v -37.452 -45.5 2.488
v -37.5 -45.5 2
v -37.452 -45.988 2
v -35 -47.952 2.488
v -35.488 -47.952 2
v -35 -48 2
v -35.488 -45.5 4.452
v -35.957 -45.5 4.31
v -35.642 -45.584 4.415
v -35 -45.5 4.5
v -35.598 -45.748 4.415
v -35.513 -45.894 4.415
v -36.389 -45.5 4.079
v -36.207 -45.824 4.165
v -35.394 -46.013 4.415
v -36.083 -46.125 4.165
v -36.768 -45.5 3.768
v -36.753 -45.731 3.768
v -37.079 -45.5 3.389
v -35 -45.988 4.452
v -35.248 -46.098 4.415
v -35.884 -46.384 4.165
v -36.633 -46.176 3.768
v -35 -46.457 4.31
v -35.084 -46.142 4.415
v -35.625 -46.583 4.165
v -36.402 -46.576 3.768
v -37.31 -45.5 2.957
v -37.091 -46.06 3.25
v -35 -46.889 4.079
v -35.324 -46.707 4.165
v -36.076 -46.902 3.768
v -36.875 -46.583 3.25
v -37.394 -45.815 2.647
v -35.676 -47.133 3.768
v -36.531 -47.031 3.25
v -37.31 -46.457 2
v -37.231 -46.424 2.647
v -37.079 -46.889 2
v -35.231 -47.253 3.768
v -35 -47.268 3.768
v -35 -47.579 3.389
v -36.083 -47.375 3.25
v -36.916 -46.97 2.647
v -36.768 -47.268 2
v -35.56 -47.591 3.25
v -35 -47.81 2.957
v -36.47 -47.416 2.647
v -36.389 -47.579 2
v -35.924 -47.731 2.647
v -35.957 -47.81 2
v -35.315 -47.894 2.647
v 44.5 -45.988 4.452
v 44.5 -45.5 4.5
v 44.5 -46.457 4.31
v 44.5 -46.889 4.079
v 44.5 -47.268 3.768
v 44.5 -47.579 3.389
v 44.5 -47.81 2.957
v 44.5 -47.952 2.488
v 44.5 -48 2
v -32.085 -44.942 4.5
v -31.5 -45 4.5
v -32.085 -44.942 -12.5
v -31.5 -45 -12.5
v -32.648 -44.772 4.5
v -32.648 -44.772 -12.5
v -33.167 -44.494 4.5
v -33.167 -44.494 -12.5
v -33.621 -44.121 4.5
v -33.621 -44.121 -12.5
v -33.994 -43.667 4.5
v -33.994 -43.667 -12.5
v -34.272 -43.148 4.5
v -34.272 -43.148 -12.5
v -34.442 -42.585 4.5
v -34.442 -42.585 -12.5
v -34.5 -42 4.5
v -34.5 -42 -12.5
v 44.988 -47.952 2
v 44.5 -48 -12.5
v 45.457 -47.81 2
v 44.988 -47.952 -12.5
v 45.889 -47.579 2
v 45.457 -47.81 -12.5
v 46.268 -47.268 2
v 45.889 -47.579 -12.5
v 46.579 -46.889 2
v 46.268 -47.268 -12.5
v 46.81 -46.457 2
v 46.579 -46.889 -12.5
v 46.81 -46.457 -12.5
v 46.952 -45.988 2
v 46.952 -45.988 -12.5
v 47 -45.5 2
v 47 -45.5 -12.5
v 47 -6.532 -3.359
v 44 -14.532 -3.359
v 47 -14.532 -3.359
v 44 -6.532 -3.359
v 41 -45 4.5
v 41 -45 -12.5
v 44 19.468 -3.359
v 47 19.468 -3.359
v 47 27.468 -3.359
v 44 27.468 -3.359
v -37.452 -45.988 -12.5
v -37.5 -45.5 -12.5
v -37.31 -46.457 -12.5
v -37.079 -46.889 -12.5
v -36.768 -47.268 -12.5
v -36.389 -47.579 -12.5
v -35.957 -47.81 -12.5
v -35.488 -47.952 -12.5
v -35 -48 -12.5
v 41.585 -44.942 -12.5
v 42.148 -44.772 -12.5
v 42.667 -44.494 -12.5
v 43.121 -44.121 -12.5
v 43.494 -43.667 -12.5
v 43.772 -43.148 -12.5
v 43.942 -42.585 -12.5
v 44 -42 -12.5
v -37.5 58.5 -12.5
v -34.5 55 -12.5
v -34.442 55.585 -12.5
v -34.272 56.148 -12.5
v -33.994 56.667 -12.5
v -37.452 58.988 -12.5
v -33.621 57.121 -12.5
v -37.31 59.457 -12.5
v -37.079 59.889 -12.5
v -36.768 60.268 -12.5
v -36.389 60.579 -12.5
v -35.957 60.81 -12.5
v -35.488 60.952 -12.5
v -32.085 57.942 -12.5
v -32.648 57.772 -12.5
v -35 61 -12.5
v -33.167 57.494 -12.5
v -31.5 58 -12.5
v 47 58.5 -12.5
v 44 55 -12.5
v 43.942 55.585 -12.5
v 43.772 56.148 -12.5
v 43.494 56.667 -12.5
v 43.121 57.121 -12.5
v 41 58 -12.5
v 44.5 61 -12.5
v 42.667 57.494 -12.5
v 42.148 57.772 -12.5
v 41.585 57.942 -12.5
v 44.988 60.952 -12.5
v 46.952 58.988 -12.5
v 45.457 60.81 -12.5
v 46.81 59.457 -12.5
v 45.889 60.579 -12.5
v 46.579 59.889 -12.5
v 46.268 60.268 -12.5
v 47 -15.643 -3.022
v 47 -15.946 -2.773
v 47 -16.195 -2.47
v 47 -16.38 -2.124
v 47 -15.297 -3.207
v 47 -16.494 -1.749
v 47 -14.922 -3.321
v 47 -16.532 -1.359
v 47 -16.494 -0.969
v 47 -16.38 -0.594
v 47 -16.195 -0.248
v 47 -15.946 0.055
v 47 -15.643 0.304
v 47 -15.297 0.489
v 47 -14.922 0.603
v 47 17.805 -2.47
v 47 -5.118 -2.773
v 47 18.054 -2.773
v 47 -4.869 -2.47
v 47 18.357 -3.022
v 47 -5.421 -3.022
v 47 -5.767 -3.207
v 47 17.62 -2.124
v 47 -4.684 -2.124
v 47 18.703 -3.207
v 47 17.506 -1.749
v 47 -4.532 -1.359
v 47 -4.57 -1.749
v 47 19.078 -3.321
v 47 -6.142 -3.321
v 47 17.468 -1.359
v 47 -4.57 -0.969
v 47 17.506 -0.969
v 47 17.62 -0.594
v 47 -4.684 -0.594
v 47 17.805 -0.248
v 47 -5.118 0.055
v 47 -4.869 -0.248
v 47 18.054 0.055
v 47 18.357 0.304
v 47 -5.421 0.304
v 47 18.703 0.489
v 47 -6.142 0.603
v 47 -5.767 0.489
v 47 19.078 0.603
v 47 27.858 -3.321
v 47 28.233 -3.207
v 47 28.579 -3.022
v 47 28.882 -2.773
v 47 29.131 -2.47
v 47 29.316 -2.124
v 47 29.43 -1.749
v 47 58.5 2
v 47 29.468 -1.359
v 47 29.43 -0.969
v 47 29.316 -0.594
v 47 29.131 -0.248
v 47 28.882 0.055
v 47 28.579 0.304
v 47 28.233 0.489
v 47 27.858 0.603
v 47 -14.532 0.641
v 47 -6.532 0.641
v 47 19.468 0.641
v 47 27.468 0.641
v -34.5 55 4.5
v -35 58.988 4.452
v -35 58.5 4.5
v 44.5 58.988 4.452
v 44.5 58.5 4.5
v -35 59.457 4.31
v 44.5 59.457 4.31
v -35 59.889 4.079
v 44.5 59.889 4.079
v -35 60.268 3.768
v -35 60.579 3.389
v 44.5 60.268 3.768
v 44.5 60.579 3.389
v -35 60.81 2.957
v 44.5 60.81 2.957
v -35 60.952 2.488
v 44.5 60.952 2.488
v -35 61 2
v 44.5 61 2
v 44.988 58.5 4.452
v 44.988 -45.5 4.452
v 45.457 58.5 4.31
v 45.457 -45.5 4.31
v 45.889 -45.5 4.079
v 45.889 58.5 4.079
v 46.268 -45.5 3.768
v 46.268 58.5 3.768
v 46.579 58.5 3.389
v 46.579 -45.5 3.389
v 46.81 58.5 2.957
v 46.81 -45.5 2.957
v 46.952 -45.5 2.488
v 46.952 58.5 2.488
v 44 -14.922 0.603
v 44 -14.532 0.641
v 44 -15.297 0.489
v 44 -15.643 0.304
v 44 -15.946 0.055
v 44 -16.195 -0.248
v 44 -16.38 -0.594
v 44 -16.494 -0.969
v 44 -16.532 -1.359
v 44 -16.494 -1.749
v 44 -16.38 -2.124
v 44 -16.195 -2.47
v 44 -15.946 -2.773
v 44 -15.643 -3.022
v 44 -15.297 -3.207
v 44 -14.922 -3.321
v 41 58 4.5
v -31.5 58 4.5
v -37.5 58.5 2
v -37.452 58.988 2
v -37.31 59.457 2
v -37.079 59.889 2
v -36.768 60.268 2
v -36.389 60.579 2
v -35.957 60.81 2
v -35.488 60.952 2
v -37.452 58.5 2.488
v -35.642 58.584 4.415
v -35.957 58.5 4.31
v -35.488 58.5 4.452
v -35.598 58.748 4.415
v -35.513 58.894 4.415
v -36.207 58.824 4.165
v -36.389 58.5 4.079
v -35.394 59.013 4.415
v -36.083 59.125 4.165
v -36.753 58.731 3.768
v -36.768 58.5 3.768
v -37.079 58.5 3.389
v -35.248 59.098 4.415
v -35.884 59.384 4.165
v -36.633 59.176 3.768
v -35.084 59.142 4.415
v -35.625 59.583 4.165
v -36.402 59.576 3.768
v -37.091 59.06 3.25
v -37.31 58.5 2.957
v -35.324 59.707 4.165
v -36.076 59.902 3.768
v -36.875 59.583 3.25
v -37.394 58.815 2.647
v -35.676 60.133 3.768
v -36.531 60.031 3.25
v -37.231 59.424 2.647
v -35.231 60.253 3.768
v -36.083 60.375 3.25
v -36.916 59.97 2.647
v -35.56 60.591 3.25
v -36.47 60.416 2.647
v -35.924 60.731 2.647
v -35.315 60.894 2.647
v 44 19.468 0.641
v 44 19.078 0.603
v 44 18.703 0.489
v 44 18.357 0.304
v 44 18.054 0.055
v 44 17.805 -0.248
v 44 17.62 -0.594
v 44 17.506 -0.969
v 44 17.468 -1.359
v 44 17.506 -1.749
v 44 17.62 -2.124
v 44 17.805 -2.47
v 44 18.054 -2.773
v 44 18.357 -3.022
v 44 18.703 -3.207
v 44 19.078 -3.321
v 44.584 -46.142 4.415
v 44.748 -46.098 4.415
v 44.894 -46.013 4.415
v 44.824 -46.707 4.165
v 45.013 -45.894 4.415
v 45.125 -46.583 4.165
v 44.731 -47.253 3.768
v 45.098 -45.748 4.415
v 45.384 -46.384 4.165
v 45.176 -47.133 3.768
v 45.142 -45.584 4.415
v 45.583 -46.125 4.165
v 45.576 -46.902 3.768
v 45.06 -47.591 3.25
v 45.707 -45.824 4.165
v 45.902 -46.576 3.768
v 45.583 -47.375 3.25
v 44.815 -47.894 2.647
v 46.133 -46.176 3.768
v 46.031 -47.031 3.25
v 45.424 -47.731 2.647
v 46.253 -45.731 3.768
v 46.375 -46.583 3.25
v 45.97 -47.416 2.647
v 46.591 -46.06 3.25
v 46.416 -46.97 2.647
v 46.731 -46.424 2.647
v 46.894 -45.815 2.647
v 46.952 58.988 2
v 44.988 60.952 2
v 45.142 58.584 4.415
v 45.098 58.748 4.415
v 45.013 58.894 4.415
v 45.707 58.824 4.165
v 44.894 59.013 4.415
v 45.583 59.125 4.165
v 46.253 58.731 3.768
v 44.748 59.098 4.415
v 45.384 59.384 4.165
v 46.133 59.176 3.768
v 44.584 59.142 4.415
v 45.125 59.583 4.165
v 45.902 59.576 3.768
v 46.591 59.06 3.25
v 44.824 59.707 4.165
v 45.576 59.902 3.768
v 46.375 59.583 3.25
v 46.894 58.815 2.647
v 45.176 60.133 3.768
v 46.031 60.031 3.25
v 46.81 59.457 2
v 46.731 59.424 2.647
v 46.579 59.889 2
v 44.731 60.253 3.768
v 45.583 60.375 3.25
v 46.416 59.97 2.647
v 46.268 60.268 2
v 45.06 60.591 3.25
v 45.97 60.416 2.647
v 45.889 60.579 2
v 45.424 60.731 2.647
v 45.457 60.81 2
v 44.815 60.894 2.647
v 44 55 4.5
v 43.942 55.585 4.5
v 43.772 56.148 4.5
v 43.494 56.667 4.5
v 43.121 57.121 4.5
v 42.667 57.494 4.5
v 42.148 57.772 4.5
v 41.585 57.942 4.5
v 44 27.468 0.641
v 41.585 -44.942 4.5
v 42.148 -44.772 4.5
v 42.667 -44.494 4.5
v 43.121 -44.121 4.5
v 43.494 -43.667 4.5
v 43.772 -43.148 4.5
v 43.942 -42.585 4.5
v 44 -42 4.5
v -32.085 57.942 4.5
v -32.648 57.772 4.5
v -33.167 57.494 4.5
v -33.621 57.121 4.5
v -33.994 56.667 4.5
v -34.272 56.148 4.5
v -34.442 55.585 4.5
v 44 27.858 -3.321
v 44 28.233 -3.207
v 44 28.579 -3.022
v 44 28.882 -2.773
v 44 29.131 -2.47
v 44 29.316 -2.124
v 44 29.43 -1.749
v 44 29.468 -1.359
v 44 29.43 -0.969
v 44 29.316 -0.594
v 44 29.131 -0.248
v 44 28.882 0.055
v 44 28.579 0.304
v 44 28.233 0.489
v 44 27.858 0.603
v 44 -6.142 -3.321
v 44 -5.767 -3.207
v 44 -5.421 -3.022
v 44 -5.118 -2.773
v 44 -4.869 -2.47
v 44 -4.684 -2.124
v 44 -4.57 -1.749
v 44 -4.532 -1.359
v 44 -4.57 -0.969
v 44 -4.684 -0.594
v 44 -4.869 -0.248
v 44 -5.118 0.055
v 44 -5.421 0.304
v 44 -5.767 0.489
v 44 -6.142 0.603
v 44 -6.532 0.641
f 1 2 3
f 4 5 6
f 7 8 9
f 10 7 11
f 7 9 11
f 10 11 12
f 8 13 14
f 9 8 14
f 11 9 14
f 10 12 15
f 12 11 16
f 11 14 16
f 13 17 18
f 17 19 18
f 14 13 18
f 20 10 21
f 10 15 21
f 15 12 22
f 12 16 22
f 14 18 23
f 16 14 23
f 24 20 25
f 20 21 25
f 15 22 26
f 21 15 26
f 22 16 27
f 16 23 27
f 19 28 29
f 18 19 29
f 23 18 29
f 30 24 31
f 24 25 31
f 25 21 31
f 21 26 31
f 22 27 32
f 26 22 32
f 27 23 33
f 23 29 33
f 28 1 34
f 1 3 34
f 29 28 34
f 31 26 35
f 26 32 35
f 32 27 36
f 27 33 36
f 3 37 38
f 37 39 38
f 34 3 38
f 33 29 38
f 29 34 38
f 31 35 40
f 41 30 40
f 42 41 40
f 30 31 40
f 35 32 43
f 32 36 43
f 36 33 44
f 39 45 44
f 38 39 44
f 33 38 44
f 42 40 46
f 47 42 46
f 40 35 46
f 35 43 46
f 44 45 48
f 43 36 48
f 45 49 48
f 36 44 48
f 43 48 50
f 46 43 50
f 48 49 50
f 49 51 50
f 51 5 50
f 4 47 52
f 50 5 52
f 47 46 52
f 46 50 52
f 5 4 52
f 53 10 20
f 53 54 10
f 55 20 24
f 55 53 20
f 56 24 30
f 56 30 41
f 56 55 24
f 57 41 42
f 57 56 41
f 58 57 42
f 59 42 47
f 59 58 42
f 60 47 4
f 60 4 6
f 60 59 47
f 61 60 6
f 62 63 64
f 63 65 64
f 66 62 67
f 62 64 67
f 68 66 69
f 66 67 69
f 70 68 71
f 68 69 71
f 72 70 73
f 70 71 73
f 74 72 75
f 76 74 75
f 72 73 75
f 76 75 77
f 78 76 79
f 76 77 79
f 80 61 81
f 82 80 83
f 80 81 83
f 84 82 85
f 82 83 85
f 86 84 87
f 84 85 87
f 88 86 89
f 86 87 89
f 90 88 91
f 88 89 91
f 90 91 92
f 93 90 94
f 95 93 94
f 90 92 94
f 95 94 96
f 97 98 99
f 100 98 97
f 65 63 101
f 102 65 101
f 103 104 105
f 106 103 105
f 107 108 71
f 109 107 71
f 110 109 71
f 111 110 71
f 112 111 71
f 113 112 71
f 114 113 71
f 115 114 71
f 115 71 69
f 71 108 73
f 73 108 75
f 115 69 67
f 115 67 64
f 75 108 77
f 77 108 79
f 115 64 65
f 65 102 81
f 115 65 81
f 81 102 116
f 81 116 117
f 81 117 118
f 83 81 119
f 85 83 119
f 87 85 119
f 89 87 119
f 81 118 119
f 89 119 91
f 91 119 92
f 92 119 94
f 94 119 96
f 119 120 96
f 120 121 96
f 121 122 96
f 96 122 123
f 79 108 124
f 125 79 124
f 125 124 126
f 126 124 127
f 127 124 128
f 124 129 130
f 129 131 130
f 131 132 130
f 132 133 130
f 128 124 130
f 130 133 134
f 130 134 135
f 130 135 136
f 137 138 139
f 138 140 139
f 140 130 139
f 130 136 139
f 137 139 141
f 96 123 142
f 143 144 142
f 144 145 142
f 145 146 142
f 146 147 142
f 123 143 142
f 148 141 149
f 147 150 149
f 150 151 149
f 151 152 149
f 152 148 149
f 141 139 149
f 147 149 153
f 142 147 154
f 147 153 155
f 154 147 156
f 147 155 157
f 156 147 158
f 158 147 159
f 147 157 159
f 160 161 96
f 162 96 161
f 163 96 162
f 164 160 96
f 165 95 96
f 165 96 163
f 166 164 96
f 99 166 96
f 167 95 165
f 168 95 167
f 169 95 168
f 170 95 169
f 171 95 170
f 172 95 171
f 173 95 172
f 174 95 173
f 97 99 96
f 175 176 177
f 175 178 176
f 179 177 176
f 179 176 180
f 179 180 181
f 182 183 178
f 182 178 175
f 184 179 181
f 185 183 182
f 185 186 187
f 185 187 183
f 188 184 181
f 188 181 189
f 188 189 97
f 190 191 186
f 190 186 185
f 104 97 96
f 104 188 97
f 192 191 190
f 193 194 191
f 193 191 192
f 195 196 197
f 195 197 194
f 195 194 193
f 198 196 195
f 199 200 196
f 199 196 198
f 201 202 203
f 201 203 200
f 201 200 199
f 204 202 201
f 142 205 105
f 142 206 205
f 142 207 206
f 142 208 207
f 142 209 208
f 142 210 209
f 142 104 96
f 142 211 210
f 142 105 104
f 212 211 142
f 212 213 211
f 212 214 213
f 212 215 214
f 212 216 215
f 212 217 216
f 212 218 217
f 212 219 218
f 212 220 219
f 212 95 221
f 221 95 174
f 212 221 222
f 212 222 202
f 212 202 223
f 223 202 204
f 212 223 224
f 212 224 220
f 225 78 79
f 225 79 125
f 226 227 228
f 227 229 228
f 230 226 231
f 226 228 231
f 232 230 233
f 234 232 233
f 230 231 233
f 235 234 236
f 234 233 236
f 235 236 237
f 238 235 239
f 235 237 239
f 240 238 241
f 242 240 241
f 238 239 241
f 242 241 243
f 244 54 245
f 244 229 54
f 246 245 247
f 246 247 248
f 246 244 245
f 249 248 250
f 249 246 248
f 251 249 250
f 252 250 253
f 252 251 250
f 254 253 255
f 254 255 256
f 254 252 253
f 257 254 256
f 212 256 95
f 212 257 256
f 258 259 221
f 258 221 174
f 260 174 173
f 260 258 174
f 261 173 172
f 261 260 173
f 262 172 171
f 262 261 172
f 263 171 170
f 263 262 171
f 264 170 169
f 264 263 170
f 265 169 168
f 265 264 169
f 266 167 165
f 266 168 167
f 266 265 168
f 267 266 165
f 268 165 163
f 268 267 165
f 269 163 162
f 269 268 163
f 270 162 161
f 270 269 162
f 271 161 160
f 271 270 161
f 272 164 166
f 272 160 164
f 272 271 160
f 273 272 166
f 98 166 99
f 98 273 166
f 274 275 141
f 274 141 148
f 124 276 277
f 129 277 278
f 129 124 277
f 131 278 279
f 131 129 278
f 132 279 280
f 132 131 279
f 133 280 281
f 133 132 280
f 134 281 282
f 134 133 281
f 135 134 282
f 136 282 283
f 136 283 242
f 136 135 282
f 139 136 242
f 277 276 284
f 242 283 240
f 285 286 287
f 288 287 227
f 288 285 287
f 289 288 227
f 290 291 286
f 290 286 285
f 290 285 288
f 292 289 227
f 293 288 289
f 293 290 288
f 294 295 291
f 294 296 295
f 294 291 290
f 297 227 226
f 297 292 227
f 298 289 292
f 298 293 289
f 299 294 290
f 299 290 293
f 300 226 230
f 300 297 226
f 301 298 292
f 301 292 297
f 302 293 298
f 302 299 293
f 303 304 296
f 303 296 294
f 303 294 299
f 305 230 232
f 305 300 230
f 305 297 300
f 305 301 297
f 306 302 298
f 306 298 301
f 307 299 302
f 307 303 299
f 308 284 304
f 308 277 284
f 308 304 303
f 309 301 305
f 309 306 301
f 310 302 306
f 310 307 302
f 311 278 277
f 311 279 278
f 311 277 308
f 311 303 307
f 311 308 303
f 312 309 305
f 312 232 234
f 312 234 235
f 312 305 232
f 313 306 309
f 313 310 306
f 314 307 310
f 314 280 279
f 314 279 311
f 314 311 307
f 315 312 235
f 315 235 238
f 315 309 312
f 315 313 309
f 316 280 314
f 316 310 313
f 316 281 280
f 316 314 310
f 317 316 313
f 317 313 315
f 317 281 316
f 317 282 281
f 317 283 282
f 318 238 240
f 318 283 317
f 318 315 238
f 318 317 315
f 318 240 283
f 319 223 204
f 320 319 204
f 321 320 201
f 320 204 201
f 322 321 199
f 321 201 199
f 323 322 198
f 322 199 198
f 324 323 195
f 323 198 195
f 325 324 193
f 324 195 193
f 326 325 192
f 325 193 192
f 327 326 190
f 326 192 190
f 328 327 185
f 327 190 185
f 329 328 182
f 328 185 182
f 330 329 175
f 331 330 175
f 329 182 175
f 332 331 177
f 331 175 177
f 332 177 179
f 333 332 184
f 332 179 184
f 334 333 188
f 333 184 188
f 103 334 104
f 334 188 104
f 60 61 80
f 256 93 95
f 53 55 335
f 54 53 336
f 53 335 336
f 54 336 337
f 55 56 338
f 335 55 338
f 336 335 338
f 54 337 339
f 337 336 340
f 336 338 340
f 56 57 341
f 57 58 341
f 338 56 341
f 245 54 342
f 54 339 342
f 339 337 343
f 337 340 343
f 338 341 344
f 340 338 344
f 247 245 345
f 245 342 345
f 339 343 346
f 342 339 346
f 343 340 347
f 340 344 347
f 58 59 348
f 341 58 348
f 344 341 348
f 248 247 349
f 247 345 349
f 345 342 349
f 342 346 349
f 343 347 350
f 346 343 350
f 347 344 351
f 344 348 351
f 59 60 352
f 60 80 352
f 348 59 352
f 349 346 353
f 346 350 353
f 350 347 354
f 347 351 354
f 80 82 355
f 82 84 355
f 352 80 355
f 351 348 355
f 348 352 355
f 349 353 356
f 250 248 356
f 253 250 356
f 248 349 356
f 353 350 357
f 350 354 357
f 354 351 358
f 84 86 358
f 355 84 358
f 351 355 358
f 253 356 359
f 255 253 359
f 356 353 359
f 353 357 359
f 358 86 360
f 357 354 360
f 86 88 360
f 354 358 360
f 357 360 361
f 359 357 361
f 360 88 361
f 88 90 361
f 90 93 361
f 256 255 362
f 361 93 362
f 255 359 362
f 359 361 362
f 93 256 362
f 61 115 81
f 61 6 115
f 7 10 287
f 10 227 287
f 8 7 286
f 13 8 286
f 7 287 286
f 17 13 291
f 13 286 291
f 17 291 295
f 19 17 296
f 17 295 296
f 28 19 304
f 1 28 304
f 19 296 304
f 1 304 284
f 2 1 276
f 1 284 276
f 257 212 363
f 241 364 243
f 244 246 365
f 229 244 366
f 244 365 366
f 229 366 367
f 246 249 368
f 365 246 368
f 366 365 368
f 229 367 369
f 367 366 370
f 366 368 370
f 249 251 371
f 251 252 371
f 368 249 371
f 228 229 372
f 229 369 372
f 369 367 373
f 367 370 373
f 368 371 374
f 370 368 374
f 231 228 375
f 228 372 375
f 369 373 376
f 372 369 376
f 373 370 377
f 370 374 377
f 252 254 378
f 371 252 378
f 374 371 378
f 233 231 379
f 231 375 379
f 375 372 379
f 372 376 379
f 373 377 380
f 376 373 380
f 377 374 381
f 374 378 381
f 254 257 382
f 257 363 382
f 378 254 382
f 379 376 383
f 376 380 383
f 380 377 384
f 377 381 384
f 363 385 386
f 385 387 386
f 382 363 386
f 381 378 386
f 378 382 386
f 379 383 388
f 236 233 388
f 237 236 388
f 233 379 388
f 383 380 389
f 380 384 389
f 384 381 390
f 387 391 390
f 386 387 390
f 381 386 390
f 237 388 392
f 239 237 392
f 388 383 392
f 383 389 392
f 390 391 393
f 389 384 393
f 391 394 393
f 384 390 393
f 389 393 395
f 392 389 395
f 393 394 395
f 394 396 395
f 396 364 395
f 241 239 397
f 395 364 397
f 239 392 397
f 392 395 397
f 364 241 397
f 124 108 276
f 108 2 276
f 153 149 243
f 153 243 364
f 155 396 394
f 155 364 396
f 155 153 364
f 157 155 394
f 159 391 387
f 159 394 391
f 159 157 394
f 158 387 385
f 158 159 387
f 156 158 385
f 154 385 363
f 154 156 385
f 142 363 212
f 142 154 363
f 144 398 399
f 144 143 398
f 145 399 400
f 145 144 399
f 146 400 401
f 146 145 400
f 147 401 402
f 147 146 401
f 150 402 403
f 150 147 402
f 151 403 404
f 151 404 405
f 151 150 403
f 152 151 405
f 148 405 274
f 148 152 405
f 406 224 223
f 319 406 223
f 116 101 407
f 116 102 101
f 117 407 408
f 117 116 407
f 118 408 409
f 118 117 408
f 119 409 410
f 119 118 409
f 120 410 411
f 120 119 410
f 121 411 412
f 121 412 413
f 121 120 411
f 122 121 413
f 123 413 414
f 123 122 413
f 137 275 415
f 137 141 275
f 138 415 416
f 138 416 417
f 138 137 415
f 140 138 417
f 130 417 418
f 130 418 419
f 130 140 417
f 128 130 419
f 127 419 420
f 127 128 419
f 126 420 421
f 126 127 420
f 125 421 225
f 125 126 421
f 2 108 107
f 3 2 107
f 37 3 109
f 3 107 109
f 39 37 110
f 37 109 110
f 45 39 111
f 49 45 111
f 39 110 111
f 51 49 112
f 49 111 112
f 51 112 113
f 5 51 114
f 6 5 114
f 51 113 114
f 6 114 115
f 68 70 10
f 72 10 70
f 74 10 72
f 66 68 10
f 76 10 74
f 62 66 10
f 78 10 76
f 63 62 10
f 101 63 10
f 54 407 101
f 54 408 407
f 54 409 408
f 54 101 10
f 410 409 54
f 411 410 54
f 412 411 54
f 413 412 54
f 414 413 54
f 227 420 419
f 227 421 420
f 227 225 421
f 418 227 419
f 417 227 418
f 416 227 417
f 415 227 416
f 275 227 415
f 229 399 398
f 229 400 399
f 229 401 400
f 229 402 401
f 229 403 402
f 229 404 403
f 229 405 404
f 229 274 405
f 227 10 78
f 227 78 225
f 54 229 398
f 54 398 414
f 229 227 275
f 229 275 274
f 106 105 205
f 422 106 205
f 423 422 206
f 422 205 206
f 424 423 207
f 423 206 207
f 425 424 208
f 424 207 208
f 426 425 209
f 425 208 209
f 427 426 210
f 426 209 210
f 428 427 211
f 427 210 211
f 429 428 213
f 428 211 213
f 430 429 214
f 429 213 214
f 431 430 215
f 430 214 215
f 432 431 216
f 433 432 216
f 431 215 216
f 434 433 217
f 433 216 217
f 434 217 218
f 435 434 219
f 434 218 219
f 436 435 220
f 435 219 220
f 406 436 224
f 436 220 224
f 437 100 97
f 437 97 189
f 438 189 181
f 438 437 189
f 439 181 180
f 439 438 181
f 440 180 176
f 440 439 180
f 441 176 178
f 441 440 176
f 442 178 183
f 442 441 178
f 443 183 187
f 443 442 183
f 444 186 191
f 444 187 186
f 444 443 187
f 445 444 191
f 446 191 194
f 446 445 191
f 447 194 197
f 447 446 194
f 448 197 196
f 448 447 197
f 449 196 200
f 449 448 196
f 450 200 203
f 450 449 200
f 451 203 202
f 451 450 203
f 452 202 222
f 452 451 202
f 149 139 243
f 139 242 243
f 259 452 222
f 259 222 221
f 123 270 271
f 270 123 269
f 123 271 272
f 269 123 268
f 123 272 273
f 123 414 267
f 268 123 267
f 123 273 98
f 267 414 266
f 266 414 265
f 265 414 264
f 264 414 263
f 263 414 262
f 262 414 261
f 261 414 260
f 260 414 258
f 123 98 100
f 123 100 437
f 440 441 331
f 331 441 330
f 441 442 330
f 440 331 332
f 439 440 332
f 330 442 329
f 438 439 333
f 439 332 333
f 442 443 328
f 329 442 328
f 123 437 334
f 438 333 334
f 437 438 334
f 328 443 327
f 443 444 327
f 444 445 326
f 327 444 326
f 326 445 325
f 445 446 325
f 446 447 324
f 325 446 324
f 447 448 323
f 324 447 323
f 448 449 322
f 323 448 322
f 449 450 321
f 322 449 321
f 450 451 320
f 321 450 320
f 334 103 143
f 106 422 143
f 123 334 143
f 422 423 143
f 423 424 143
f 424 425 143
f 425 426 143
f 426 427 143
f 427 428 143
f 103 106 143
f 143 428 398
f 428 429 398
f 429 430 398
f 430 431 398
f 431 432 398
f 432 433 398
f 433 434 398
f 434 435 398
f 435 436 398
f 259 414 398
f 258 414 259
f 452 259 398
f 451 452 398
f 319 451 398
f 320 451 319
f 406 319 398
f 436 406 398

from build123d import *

# Parameters (mm, degrees)
SKETCH010_W     = 84.5
SKETCH010_H     = 109
SKETCH010_W_2   = 78.5
SKETCH010_H_2   = 103
PAD004_DEPTH    = 17
FILLET_R        = 3
FILLET002_R     = 2.5
POCKET025_DEPTH = 9.5


with BuildPart() as part:
    # Sketch010 → Pad004 (new body)
    with BuildSketch(Plane.XY):
        with Locations((4.75, 6.5)):
            Rectangle(SKETCH010_W, SKETCH010_H)
        with Locations((4.75, 6.5)):
            Rectangle(SKETCH010_W_2, SKETCH010_H_2, mode=Mode.SUBTRACT)
    extrude(amount=-PAD004_DEPTH)

    # Fillet
    fillet_edges = [part.edges().sort_by_distance(p)[0] for p in [
        (-34.5, 58, -8.5),
        (-34.5, -45, -8.5),
        (44, 58, -8.5),
        (44, -45, -8.5),
    ]]
    fillet(fillet_edges, radius=FILLET_R)

    # Fillet002
    fillet002_edges = [part.edges().sort_by_distance(p)[0] for p in [
        (47, 61, -8.5),
        (-37.5, 61, -8.5),
        (47, -48, -8.5),
        (-37.5, -48, -8.5),
        (-37.5, 6.5, 0),
        (4.75, -48, 0),
        (47, 6.5, 0),
        (4.75, 61, 0),
    ]]
    fillet(fillet002_edges, radius=FILLET002_R)

    # Sketch058 → Pocket025 (cut, symmetric)
    with BuildSketch(Plane.YZ.offset(41)):
        with BuildLine():
            ThreePointArc((-14.532044, -3.85902), (-16.532044, -5.85902), (-14.532044, -7.85902))
            Line((-14.532044, -7.85902), (-6.532044, -7.85902))
            ThreePointArc((-6.532044, -7.85902), (-4.532044, -5.85902), (-6.532044, -3.85902))
            Line((-6.532044, -3.85902), (-14.532044, -3.85902))
        make_face()
        with BuildLine():
            ThreePointArc((19.467956, -3.85902), (17.467956, -5.85902), (19.467956, -7.85902))
            Line((19.467956, -7.85902), (27.467956, -7.85902))
            ThreePointArc((27.467956, -7.85902), (29.467956, -5.85902), (27.467956, -3.85902))
            Line((27.467956, -3.85902), (19.467956, -3.85902))
        make_face()
    extrude(amount=POCKET025_DEPTH, both=True, mode=Mode.SUBTRACT)


with BuildPart() as part_1:
    # Body005 placement: moved
    add(part.part.moved(Location((0, 0, 4.5))))


solid = part_1.part
